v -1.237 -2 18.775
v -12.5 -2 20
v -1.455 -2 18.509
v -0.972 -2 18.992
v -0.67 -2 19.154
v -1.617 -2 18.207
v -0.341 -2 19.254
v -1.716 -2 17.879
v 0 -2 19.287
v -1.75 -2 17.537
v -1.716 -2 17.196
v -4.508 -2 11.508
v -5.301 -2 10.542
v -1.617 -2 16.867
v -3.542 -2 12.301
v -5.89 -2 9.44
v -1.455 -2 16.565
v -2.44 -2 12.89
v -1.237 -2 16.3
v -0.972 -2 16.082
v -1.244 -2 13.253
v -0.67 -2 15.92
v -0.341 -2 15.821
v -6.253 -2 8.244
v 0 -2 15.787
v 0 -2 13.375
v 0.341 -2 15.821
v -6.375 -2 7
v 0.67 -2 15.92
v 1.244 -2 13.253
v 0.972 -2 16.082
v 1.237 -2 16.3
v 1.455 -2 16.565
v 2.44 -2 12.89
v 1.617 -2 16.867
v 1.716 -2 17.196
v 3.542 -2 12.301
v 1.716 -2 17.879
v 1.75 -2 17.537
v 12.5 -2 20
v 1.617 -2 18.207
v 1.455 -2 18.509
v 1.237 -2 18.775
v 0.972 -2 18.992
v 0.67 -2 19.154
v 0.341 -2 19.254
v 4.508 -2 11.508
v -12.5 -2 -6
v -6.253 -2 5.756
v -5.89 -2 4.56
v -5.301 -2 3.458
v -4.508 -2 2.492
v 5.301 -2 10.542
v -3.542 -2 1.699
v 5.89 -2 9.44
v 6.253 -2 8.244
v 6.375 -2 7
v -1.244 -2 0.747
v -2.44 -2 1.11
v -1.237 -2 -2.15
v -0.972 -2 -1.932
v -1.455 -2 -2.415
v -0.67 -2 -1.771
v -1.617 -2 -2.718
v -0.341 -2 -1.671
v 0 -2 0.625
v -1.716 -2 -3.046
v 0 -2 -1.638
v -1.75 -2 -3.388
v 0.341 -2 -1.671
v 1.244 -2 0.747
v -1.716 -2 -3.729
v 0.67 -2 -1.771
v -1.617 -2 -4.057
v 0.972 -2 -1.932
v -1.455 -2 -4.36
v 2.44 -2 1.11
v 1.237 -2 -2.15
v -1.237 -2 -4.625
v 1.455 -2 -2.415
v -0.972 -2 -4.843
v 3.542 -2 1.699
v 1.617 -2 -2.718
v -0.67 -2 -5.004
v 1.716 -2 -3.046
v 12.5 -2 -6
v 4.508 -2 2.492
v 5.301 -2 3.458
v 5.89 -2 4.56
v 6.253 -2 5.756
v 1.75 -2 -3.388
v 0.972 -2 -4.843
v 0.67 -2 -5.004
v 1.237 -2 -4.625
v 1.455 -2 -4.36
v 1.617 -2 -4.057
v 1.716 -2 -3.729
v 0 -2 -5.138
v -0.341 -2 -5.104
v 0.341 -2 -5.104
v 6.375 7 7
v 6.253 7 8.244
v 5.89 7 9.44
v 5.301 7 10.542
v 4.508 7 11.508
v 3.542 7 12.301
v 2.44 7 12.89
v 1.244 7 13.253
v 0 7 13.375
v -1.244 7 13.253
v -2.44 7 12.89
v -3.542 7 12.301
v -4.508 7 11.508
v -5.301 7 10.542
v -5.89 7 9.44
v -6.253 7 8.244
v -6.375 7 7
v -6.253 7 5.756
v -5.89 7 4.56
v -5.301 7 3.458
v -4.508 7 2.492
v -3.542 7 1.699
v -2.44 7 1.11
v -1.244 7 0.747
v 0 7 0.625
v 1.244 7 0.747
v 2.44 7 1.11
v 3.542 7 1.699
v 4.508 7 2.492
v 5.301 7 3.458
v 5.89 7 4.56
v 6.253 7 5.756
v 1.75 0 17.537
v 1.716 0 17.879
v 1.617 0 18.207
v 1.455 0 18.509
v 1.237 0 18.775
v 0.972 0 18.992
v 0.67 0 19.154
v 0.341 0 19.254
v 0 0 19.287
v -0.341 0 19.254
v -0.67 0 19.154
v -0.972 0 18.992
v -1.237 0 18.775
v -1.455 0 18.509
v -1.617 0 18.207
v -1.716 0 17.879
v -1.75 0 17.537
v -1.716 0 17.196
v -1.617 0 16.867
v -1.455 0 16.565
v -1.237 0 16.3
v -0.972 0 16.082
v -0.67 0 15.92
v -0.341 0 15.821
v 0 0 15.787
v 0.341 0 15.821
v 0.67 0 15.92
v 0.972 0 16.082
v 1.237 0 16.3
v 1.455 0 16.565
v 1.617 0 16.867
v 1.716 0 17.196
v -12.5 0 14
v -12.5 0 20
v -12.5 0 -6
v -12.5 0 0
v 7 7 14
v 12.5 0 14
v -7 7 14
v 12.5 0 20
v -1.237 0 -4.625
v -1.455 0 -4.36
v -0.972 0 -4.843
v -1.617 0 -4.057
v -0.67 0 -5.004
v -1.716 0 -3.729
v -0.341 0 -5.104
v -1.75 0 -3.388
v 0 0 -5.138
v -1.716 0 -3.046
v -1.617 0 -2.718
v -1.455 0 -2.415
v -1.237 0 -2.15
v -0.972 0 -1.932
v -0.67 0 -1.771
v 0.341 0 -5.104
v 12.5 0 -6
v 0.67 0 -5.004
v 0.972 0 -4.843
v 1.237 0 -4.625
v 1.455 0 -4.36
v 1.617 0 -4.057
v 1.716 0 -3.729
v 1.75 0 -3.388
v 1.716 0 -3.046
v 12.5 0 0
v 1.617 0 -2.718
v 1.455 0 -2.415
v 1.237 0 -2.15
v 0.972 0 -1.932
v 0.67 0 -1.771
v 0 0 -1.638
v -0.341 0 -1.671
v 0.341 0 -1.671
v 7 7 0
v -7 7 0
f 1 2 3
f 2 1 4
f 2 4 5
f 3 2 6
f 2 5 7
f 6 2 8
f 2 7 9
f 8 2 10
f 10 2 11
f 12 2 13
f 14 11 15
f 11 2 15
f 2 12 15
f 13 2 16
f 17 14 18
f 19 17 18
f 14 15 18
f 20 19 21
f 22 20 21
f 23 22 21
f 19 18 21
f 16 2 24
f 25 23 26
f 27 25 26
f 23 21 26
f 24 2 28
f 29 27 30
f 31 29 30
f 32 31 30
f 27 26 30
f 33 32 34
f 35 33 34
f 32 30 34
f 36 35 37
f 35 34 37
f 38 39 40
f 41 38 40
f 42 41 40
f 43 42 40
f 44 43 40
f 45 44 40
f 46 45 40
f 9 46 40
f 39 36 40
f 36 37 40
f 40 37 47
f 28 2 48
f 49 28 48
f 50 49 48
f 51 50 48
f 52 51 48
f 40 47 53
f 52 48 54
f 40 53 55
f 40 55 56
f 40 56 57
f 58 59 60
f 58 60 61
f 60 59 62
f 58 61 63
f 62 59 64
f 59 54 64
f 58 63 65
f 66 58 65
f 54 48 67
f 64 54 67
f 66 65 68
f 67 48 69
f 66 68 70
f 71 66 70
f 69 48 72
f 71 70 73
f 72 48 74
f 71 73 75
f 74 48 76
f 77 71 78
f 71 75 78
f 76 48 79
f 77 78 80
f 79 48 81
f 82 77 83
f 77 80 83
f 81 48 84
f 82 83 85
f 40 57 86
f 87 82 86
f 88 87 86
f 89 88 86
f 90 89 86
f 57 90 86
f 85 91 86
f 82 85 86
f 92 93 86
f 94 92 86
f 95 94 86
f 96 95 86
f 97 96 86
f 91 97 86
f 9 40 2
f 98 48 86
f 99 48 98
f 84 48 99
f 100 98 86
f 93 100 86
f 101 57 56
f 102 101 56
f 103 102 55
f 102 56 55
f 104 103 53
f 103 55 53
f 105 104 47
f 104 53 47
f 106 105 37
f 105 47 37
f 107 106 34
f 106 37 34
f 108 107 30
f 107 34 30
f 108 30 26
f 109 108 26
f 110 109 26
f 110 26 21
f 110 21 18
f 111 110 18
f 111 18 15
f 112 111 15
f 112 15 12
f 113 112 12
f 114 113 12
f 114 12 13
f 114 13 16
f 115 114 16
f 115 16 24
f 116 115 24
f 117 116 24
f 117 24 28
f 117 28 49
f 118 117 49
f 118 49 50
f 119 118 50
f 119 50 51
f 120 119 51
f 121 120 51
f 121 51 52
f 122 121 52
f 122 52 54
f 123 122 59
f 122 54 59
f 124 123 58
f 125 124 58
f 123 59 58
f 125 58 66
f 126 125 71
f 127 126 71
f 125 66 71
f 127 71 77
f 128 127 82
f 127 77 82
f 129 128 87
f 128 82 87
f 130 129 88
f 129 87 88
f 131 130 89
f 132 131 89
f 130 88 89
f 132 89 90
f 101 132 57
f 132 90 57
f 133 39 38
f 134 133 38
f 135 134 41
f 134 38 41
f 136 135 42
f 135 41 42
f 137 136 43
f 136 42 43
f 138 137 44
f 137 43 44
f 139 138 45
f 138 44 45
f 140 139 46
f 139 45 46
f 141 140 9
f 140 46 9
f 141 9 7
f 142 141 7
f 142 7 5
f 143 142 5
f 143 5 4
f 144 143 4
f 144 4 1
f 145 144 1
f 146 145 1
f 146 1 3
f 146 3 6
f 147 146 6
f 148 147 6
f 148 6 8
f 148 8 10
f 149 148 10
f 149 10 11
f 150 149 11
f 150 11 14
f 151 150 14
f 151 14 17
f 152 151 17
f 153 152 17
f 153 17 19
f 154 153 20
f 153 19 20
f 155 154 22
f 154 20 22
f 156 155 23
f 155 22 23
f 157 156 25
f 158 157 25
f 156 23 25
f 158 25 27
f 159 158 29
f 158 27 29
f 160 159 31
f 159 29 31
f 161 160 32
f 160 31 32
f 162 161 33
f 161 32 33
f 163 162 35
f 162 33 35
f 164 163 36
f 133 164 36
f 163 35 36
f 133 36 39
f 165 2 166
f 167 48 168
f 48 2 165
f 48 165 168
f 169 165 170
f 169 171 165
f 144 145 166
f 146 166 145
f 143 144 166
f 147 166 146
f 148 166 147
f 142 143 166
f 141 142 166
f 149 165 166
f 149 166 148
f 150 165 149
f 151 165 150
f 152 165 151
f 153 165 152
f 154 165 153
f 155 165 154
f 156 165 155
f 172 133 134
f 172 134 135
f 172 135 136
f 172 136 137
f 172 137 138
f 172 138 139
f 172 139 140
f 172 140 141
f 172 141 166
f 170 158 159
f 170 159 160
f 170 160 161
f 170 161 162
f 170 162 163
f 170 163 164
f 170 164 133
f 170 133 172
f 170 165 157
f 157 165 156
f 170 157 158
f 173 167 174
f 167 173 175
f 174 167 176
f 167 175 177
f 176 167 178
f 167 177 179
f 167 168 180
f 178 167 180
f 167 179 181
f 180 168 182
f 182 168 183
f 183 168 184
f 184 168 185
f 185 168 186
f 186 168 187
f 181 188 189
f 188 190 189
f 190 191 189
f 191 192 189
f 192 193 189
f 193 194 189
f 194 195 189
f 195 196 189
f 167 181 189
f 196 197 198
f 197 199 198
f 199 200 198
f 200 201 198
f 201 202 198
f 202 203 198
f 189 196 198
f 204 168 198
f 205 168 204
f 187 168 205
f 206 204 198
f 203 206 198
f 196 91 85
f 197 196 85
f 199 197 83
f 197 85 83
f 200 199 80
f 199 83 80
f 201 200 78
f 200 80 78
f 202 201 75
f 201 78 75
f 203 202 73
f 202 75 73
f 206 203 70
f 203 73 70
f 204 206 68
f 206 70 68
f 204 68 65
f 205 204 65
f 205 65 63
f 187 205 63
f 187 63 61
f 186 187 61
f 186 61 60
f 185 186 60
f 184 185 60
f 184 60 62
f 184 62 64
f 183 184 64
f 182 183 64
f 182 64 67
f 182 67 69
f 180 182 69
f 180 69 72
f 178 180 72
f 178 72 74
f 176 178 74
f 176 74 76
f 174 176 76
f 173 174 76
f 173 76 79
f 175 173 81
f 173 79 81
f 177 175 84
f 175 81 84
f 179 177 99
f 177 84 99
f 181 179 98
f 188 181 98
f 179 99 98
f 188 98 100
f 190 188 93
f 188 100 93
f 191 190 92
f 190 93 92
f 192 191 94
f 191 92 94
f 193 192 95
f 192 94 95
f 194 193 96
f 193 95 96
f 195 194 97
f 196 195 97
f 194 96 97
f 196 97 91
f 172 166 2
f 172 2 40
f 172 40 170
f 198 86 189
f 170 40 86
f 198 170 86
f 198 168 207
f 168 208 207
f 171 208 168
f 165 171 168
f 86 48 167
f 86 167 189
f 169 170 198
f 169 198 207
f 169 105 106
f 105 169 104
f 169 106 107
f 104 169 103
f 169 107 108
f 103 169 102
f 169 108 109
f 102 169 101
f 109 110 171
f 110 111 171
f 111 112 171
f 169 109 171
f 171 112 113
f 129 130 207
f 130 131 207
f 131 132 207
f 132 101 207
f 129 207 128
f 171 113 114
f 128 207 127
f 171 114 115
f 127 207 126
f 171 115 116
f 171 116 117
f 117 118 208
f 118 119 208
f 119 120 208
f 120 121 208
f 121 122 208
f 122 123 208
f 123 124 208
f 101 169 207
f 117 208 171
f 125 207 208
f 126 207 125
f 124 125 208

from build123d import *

# Parameters (mm, degrees)
F1_DEPTH = 14
F3_W     = 25
F3_H     = 2
F4_DEPTH = 6
F5_W     = 25
F5_H     = 2
F6_DEPTH = 6
F8_D     = 3.5
F10_D    = 3.5
F11_D    = 12.75


with BuildPart() as f1:
    # F0 (on Top) → F1 (new body)
    with BuildSketch(Plane.XY):
        Polygon((12.5, 0), (0, 0), (-12.5, 0), (-12.5, -2), (12.5, -2), align=None)
        Polygon((-12.5, 0), (0, 0), (12.5, 0), (7, 7), (0, 7), (-7, 7), align=None)
    extrude(amount=F1_DEPTH)

    # F3 (on face) → F4 (join)
    with BuildSketch(Plane(origin=(0, 0, 0), x_dir=(1, 0, 0), z_dir=(0, 0, -1))):
        with Locations((0, 1)):
            Rectangle(F3_W, F3_H)
    extrude(amount=F4_DEPTH)

    # F5 (on face) → F6 (join)
    with BuildSketch(Plane.XY.offset(14)):
        with Locations((0, -1)):
            Rectangle(F5_W, F5_H)
    extrude(amount=F6_DEPTH)

    # F8 (through all)
    with Locations(Plane(origin=(0, 0, 0), x_dir=(-1, 0, 0), z_dir=(0, 1, 0))):
        with Locations((0, -3.387567)):
            Hole(F8_D / 2)

    # F10 (through all)
    with Locations(Plane(origin=(0, 0, 0), x_dir=(-1, 0, 0), z_dir=(0, 1, 0))):
        with Locations((0, 17.537134)):
            Hole(F10_D / 2)

    # F11 (through all)
    with Locations(Plane(origin=(0, 7, 0), x_dir=(-1, 0, 0), z_dir=(0, 1, 0))):
        with Locations((0, 7)):
            Hole(F11_D / 2)


solid = f1.part
